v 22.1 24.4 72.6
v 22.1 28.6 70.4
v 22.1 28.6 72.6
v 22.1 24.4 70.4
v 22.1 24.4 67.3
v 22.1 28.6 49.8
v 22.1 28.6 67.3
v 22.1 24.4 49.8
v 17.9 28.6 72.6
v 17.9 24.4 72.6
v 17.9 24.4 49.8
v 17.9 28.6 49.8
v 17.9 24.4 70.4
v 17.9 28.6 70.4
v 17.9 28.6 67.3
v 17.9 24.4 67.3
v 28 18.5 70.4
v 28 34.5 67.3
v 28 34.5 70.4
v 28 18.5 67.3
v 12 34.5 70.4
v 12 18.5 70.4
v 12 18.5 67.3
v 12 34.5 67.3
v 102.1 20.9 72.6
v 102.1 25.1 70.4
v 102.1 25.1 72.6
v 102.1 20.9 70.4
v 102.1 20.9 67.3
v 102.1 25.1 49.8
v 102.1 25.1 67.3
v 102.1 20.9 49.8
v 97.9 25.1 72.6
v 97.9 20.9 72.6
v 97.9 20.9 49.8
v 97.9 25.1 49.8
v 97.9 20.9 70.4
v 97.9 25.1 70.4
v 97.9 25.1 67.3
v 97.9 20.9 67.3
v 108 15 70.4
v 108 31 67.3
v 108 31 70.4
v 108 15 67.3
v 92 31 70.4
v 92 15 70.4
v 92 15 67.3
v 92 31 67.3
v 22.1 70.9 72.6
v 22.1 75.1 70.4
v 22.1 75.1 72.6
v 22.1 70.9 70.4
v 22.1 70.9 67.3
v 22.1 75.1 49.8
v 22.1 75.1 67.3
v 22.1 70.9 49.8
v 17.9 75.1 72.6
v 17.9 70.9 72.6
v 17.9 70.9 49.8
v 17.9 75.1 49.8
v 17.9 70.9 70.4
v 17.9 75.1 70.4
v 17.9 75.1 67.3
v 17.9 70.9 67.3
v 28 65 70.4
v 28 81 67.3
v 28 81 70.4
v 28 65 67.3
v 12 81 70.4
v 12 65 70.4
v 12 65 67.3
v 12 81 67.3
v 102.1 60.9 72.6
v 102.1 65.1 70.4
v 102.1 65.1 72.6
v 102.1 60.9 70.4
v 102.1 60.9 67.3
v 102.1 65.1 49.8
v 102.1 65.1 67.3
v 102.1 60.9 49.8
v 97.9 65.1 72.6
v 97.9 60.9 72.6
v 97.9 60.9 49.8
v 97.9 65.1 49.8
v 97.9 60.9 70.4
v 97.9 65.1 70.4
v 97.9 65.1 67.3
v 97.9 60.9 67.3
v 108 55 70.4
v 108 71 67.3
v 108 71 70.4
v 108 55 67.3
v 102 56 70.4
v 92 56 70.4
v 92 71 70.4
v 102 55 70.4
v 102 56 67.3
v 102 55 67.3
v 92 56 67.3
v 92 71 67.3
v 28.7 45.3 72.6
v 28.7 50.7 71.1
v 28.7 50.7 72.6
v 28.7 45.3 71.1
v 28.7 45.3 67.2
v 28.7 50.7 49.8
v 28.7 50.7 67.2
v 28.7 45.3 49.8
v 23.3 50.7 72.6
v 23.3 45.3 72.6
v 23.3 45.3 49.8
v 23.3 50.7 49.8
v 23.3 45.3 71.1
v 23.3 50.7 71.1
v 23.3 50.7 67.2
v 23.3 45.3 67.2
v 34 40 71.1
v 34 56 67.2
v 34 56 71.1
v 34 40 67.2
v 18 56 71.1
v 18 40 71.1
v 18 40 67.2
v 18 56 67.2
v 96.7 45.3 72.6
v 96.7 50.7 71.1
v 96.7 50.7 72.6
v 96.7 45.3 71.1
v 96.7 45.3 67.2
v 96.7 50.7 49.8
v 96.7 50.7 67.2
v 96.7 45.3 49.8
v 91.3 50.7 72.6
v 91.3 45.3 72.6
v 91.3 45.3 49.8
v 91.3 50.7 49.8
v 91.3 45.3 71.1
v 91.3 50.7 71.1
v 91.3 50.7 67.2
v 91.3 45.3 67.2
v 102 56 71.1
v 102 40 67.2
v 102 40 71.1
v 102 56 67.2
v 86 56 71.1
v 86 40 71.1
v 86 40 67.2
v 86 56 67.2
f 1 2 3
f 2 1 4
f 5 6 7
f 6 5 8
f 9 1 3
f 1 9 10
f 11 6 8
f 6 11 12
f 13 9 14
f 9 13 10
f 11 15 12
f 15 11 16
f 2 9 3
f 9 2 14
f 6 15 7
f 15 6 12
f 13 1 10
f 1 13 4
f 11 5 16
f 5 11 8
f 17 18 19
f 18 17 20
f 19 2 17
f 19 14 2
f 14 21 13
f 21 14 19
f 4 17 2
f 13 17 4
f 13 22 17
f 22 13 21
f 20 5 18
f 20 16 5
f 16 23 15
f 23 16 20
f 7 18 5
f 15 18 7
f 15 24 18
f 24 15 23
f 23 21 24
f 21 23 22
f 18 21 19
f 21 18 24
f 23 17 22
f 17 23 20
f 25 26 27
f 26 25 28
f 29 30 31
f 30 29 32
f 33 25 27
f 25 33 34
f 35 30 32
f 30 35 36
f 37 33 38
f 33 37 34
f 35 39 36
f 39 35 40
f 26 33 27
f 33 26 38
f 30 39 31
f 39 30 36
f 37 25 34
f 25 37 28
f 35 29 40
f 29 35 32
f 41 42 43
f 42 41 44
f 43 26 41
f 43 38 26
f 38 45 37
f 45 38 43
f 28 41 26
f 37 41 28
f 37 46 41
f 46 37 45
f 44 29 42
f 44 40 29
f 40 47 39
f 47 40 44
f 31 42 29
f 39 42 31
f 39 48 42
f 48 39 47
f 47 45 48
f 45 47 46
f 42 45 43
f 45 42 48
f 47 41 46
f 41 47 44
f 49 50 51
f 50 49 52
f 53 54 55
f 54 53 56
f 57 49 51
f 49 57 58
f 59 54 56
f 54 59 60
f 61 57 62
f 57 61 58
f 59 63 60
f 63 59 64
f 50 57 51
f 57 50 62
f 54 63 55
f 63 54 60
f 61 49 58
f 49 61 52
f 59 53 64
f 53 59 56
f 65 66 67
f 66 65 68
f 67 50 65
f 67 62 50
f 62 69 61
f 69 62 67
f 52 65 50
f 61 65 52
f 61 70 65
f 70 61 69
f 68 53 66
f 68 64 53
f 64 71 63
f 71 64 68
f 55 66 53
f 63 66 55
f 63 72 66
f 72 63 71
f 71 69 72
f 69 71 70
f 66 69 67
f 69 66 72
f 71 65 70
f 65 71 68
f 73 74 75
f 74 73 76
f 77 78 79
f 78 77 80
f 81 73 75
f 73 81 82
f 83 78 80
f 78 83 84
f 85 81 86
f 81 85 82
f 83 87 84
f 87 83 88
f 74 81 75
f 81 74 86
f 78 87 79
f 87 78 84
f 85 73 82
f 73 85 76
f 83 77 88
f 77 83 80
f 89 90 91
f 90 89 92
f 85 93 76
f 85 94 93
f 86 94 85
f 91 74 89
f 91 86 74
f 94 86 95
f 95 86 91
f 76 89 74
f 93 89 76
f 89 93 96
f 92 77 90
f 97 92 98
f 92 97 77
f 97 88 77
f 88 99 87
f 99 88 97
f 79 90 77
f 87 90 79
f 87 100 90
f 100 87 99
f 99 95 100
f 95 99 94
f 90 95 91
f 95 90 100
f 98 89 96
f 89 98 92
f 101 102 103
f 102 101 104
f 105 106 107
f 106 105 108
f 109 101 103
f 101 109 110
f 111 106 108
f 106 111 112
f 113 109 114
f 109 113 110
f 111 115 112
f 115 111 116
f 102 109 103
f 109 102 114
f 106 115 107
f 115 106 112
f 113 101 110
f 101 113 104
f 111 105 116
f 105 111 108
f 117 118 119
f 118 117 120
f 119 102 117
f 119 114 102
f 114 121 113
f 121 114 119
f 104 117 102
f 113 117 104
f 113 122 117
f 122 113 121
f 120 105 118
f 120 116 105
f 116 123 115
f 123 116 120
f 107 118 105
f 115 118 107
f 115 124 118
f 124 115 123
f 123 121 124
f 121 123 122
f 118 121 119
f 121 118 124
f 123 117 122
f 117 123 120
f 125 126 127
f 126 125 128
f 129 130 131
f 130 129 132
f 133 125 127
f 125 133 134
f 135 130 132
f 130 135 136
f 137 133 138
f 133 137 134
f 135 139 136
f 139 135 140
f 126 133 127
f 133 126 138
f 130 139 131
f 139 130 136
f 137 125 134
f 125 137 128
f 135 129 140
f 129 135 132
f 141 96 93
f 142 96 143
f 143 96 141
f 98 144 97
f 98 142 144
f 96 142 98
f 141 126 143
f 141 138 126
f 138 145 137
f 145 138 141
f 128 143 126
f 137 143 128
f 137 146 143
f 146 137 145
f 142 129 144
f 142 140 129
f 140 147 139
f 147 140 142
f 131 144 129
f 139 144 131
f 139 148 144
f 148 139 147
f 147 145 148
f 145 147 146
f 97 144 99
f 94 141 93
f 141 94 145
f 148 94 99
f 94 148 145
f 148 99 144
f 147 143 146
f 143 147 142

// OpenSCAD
// Generated by spec/prepare_parent_retrofit_printing.py from validated release fasteners. NOT A PRINTABLE PART.
union(){
translate([17.9, 24.4, 49.8]) cube([4.2, 4.2, 22.800001525878905]);
translate([12, 18.5, 67.3]) cube([16, 16, 3.0999999999999996]);
translate([97.9, 20.9, 49.8]) cube([4.2, 4.2, 22.800001525878905]);
translate([92, 15, 67.3]) cube([16, 16, 3.0999999999999996]);
translate([17.9, 70.9, 49.8]) cube([4.2, 4.2, 22.800001525878905]);
translate([12, 65, 67.3]) cube([16, 16, 3.0999999999999996]);
translate([97.9, 60.9, 49.8]) cube([4.2, 4.2, 22.800001525878905]);
translate([92, 55, 67.3]) cube([16, 16, 3.0999999999999996]);
translate([23.3, 45.3, 49.8]) cube([5.4, 5.4, 22.800001525878905]);
translate([18, 40, 67.2]) cube([16, 16, 3.9000000000000004]);
translate([91.3, 45.3, 49.8]) cube([5.4, 5.4, 22.800001525878905]);
translate([86, 40, 67.2]) cube([16, 16, 3.9000000000000004]);
}
